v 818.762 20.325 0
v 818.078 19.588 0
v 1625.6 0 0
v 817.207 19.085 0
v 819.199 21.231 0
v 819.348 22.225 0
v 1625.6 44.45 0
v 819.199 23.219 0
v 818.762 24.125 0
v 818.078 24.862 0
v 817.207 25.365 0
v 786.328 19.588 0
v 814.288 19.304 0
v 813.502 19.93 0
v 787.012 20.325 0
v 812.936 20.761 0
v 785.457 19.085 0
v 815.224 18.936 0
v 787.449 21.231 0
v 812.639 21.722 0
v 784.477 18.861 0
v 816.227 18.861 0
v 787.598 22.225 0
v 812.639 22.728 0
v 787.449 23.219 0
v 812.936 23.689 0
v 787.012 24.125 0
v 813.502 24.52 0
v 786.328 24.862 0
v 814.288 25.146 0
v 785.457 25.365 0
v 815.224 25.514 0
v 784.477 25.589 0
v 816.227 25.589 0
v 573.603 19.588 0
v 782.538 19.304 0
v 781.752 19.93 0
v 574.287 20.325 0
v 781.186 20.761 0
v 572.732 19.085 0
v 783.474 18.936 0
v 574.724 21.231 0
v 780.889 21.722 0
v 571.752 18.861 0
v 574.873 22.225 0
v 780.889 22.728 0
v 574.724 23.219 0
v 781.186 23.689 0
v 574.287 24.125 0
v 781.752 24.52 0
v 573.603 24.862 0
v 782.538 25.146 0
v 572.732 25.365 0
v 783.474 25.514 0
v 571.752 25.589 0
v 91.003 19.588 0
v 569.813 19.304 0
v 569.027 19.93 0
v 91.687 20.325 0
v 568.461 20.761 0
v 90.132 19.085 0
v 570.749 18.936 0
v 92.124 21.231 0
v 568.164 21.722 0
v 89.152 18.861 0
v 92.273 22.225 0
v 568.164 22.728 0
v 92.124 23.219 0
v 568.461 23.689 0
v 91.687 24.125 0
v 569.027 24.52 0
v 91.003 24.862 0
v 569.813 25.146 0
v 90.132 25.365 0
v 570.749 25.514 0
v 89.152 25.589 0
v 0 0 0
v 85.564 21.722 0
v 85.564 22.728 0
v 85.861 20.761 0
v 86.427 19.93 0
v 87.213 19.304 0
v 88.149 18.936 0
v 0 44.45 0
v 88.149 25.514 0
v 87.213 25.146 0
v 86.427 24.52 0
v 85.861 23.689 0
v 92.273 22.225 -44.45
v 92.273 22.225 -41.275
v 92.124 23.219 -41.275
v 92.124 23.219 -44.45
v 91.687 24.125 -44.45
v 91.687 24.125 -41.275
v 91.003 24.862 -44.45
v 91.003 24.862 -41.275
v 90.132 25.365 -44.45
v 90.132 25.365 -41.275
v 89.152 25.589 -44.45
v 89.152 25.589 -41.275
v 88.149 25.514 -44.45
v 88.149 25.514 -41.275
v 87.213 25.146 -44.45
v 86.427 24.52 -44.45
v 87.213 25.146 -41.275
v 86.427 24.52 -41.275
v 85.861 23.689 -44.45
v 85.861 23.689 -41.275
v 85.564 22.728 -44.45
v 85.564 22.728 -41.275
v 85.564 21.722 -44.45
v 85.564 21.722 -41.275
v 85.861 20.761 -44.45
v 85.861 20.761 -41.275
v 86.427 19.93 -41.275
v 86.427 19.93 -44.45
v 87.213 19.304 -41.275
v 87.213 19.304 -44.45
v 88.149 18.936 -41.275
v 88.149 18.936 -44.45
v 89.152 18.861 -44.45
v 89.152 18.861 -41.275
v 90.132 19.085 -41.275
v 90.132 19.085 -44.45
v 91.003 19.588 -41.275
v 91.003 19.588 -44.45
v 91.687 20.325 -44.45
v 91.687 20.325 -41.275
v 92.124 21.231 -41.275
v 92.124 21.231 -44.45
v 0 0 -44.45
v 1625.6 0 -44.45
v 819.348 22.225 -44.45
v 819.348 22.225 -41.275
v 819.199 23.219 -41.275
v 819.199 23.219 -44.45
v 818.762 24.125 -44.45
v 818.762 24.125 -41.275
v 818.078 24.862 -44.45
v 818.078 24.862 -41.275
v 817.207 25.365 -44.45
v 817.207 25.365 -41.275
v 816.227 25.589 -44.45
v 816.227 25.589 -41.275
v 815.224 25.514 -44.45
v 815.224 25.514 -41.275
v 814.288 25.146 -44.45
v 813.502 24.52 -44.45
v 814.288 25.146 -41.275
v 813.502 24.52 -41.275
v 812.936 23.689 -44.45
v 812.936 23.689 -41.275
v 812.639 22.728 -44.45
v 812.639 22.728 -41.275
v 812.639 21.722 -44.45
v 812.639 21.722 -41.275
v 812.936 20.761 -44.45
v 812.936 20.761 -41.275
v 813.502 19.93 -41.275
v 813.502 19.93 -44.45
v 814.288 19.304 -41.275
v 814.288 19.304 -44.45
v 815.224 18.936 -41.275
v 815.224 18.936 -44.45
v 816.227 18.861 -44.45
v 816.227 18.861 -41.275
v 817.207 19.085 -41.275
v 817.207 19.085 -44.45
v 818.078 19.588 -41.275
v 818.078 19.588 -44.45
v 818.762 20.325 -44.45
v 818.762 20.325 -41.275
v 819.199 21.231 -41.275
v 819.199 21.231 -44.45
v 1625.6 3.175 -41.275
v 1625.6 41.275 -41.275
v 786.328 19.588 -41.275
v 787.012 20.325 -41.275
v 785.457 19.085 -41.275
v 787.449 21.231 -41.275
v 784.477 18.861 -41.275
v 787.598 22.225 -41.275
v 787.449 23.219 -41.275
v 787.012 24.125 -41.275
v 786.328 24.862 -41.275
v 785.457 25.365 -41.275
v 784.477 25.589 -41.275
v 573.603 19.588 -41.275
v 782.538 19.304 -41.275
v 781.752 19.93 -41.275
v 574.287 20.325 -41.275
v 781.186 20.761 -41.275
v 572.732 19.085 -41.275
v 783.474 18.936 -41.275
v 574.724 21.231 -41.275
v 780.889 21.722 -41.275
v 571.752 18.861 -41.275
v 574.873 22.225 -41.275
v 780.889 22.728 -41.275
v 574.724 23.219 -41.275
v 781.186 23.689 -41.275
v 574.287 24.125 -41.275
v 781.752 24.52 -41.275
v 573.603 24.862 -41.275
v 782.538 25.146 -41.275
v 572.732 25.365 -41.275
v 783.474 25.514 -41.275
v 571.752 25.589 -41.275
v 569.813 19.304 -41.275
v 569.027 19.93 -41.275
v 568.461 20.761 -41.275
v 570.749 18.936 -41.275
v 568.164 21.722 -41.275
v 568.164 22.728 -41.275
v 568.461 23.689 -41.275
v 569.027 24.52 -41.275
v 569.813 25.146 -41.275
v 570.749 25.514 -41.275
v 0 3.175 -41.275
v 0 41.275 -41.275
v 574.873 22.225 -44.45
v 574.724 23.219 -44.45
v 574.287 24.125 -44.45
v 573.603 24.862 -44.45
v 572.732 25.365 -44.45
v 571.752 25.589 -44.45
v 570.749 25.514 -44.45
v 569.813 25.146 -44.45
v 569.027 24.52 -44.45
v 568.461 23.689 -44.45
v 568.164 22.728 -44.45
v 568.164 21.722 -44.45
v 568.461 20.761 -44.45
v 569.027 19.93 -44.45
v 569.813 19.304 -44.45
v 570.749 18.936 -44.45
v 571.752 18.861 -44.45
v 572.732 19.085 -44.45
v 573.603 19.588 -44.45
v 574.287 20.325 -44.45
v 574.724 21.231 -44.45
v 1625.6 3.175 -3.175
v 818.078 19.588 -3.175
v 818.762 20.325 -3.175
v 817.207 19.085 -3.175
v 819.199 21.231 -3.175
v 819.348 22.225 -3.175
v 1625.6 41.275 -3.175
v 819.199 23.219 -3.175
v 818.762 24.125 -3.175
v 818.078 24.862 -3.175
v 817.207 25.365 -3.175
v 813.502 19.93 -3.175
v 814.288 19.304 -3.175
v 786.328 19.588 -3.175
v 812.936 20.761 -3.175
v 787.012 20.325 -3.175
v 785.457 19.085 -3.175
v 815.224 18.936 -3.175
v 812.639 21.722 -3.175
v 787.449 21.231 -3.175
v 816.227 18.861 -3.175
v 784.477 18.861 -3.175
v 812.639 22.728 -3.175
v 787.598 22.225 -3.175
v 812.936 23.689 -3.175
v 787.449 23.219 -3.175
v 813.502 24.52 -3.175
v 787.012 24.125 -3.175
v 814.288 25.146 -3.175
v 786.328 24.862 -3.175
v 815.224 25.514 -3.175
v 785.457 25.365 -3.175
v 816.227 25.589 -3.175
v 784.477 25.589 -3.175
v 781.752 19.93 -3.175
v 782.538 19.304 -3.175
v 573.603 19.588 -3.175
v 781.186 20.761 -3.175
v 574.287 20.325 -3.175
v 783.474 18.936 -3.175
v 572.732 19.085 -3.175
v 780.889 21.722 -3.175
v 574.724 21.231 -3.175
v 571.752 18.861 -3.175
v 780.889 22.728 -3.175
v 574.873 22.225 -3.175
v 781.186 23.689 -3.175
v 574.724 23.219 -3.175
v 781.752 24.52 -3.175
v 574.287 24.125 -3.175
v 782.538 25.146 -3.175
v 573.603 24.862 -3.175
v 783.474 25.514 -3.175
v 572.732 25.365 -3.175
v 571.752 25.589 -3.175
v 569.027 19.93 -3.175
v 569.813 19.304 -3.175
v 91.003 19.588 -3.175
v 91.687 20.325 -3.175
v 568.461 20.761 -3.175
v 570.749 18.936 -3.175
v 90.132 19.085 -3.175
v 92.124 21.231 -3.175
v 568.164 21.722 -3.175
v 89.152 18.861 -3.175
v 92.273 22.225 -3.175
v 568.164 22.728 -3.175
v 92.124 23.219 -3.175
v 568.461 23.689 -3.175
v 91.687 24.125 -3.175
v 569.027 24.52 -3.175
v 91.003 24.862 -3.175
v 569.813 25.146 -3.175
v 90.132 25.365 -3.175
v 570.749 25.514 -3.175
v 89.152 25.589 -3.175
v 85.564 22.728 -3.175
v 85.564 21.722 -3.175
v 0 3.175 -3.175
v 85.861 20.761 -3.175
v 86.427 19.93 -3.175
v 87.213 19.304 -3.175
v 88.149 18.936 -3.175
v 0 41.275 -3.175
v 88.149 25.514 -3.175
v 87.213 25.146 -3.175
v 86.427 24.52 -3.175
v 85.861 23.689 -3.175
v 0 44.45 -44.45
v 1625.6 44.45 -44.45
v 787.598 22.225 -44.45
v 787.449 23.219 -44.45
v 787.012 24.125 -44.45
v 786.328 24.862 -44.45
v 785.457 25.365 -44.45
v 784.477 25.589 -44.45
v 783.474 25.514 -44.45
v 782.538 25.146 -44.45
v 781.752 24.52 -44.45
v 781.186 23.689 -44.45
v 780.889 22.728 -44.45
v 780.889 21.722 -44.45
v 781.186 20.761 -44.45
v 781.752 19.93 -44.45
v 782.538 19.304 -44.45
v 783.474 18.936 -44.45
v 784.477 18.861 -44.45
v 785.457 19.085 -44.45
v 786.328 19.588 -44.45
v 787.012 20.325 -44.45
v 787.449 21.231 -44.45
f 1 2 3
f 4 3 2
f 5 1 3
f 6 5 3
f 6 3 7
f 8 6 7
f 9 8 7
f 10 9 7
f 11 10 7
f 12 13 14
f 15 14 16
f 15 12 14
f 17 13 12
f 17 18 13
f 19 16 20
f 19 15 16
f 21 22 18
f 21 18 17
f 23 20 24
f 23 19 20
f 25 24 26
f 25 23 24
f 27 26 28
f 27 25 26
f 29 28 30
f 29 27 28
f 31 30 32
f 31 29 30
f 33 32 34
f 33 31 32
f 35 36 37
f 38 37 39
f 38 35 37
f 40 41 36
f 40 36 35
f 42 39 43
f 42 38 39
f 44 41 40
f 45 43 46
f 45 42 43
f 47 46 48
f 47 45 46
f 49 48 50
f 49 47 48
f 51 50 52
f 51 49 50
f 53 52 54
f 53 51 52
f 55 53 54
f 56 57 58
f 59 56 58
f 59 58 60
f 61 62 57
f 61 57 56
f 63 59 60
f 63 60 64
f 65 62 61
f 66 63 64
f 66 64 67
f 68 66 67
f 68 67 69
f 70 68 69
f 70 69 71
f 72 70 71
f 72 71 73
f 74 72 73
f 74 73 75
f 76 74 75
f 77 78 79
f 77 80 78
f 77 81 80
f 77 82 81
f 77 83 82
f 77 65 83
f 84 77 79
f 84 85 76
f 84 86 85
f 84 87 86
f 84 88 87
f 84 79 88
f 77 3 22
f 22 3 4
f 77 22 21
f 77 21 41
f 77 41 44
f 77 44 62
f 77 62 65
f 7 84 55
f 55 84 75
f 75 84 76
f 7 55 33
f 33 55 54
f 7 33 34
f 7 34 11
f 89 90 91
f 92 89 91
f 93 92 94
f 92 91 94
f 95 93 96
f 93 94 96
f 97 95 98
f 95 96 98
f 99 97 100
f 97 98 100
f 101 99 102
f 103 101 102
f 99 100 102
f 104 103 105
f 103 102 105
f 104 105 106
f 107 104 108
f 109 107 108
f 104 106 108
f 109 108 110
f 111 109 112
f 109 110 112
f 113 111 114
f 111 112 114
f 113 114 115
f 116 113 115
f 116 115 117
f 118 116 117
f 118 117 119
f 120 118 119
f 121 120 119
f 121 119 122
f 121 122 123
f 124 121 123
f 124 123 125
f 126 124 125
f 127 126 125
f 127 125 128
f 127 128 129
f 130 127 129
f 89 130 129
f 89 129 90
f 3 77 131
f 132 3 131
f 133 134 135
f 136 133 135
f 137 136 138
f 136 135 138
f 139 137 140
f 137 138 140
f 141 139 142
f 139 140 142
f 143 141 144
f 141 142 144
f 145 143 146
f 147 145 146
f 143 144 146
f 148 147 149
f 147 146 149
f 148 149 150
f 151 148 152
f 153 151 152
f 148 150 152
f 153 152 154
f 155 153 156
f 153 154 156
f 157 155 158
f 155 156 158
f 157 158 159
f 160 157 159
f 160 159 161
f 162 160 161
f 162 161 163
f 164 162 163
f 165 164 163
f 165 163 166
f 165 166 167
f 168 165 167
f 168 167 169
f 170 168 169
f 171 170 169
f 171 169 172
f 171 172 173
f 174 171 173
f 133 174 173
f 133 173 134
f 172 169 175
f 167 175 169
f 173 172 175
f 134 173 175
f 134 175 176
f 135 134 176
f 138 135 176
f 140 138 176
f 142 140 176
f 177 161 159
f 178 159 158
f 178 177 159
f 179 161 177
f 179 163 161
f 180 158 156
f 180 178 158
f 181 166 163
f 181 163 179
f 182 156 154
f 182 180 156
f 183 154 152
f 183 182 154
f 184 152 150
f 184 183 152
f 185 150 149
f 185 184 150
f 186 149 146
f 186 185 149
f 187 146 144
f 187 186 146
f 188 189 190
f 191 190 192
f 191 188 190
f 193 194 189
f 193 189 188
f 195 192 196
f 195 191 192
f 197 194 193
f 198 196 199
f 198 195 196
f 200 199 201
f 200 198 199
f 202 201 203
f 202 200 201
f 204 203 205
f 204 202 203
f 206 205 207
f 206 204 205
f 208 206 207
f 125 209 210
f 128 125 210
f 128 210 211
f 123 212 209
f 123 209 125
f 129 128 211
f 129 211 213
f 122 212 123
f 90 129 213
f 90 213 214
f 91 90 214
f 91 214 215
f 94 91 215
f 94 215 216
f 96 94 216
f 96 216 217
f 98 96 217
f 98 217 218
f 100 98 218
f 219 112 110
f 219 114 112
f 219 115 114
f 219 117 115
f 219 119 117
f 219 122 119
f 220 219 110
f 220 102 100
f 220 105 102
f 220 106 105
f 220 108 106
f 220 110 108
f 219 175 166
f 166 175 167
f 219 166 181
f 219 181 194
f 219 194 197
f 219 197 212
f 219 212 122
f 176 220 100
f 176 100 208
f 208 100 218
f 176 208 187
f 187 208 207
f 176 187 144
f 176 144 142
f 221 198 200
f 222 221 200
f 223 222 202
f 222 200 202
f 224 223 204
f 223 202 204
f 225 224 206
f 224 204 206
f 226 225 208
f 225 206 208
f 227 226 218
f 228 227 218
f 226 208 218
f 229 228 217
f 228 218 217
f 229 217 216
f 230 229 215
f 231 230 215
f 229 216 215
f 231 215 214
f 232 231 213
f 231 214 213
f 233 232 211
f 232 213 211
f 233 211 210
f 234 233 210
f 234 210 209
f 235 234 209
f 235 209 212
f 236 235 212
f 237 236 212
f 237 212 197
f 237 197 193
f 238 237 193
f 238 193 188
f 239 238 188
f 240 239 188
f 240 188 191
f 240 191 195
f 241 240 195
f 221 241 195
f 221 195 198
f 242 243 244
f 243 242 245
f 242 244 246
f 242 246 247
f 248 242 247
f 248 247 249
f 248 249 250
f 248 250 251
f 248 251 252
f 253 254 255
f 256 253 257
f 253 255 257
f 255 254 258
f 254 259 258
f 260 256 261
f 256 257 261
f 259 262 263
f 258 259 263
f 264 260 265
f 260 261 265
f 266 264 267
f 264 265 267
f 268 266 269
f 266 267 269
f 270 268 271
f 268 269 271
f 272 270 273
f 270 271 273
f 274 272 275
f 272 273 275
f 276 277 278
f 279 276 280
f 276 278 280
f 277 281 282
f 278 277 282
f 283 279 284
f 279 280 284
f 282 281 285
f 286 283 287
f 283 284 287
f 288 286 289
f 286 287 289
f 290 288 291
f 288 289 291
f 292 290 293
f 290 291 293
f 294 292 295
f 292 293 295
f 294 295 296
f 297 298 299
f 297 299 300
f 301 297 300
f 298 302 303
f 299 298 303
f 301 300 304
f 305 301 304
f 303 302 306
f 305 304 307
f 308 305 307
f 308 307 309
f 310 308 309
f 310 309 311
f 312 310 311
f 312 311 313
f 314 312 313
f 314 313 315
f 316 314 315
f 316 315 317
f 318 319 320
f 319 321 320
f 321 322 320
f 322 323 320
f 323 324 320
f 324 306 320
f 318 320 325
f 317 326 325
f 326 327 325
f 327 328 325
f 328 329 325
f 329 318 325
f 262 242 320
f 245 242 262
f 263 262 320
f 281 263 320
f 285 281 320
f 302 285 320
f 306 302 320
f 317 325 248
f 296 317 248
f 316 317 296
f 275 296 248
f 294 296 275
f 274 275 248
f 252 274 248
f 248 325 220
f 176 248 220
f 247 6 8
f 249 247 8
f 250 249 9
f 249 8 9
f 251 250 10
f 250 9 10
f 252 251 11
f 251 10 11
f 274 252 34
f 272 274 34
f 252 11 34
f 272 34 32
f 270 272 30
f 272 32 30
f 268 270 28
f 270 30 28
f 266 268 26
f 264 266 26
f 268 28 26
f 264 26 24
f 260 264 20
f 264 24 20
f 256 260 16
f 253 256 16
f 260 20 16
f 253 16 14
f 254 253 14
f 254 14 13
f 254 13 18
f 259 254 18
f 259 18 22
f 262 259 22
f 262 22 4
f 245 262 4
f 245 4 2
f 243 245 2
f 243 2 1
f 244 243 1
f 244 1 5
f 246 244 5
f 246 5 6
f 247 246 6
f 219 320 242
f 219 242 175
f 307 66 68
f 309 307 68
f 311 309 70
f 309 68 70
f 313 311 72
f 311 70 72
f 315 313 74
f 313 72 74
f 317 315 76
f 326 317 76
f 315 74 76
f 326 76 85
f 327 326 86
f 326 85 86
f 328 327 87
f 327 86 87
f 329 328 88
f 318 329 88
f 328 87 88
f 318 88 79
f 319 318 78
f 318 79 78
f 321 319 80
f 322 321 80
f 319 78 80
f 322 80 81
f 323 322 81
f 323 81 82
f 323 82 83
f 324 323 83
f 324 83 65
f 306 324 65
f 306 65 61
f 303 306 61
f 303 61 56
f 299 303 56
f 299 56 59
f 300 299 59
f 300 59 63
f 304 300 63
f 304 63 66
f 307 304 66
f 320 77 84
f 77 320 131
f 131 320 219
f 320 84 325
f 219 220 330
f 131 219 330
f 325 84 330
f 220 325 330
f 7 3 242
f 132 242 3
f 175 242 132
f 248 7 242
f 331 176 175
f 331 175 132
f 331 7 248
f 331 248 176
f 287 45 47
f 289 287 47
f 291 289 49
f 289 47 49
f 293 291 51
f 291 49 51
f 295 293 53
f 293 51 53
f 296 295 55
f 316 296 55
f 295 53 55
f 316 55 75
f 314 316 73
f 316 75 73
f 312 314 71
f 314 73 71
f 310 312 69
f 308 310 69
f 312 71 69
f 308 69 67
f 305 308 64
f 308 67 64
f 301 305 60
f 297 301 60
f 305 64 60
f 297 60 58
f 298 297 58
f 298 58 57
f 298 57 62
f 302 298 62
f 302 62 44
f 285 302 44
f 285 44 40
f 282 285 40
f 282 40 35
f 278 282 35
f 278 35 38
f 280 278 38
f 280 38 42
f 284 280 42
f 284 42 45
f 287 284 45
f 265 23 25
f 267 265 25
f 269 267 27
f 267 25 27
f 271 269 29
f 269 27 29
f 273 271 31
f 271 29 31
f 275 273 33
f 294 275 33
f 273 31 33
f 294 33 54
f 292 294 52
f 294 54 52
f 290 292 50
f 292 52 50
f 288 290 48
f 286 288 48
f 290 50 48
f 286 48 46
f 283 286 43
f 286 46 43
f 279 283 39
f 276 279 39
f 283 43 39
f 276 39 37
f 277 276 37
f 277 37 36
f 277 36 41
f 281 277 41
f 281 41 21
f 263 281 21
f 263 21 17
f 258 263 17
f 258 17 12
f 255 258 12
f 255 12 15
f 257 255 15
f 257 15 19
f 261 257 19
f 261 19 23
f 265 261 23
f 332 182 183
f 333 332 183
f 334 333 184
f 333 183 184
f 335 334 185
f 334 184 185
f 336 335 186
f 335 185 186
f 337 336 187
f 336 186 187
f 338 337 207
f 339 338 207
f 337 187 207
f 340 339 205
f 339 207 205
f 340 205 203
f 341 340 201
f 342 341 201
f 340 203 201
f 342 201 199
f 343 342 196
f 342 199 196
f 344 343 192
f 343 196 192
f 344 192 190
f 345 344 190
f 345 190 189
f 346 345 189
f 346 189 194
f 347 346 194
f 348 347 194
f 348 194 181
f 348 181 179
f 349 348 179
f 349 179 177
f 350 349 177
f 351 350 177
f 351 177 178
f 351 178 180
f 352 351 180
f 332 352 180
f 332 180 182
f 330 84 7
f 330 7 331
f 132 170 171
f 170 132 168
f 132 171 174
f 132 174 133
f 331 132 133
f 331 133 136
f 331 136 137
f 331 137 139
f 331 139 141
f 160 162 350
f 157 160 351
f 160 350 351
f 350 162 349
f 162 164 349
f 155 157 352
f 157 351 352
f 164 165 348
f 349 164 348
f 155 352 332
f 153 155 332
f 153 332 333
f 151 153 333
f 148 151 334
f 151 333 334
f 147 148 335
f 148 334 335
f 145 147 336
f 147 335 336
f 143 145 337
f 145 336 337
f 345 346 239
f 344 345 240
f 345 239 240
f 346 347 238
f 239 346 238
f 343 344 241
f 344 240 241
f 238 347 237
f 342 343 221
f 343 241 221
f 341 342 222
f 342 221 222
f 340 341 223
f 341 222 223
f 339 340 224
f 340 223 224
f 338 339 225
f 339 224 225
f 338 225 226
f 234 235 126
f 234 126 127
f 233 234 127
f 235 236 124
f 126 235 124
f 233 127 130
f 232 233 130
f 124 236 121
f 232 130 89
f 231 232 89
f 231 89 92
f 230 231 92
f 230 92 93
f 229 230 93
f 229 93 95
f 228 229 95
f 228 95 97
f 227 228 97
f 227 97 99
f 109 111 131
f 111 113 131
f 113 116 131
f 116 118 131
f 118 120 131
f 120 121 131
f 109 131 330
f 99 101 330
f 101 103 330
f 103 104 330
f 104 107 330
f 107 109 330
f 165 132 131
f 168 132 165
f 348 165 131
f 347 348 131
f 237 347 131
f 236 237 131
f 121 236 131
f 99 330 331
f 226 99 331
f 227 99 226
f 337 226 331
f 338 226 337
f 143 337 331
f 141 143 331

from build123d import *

# Parameters (mm, degrees)
SKETCH1_W           = 44.45
SKETCH1_H           = 44.45
SKETCH1_W_2         = 38.1
SKETCH1_H_2         = 38.1
BOSS_EXTRUDE1_DEPTH = 1625.6
SKETCH2_R           = 3.3734375
CUT_EXTRUDE1_DEPTH  = 45.45


with BuildPart() as part:
    # Sketch1 → Boss-Extrude1 (new body)
    with BuildSketch(Plane(origin=(0, 0, 0), x_dir=(0, 0, -1), z_dir=(1, 0, 0))):
        with Locations((22.225, 22.225)):
            Rectangle(SKETCH1_W, SKETCH1_H)
        with Locations((22.225, 22.225)):
            Rectangle(SKETCH1_W_2, SKETCH1_H_2, mode=Mode.SUBTRACT)
    extrude(amount=BOSS_EXTRUDE1_DEPTH)

    # Sketch2 → Cut-Extrude1 (cut, through all)
    with BuildSketch(Plane.XY):
        with Locations((784.225, 22.225)):
            Circle(SKETCH2_R)
        with Locations((815.975, 22.225)):
            Circle(SKETCH2_R)
        with Locations((571.5, 22.225)):
            Circle(SKETCH2_R)
        with Locations((88.9, 22.225)):
            Circle(SKETCH2_R)
    extrude(amount=-CUT_EXTRUDE1_DEPTH, mode=Mode.SUBTRACT)


solid = part.part
